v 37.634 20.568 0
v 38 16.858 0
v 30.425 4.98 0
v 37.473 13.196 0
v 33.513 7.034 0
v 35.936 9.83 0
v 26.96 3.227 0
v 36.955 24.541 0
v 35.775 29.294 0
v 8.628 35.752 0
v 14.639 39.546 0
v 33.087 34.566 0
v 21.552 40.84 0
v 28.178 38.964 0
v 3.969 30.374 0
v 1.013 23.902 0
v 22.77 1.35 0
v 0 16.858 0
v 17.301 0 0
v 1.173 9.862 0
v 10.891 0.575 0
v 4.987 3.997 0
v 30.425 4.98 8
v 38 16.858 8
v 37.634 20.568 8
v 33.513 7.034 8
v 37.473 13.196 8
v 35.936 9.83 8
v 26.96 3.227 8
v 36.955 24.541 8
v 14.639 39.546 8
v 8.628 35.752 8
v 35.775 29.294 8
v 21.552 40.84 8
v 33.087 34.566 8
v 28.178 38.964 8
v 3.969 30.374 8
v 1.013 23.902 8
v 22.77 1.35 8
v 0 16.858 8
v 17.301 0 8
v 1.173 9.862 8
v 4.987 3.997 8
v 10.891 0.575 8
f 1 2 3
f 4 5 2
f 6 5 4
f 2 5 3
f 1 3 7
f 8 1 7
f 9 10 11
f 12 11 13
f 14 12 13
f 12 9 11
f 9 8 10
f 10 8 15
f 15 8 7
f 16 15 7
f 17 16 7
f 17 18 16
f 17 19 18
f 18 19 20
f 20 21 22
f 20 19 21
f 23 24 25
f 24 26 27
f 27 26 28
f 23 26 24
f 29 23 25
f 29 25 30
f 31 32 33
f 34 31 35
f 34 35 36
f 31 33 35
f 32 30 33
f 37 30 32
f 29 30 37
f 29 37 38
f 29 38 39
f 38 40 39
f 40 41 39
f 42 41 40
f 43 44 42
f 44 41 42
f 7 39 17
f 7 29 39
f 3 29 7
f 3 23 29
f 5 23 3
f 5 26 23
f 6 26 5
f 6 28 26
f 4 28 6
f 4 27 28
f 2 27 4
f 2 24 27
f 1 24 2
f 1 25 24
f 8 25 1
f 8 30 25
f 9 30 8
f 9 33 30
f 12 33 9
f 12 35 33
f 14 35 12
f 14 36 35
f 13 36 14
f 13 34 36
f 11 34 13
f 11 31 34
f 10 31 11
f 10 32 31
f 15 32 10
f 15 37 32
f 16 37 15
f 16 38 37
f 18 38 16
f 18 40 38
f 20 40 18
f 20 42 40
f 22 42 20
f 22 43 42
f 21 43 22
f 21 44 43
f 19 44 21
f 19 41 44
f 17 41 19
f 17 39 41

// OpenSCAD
$fn = 32;

// ----------------------------------------------------------------------
// Cam disc: base radius 13.0 mm, lift 12.0 mm, 22 profile points
// ----------------------------------------------------------------------

// --- parameters (mm) ---
profile_height = 8;       // extrusion height
profile_points = 22;      // points of the closed outline

profile = [[38, 16.858], [37.634, 20.568], [36.955, 24.541], [35.775, 29.294], [33.087, 34.566], [28.178, 38.964], [21.552, 40.84], [14.639, 39.546], [8.628, 35.752], [3.969, 30.374], [1.013, 23.902], [0, 16.858], [1.173, 9.862], [4.987, 3.997], [10.891, 0.575], [17.301, 0], [22.77, 1.35], [26.96, 3.227], [30.425, 4.98], [33.513, 7.034], [35.936, 9.83], [37.473, 13.196]];  // single closed polygon, 22 points, counter clockwise

// --- the one profile operation ---
linear_extrude(height = profile_height) polygon(points = profile);
